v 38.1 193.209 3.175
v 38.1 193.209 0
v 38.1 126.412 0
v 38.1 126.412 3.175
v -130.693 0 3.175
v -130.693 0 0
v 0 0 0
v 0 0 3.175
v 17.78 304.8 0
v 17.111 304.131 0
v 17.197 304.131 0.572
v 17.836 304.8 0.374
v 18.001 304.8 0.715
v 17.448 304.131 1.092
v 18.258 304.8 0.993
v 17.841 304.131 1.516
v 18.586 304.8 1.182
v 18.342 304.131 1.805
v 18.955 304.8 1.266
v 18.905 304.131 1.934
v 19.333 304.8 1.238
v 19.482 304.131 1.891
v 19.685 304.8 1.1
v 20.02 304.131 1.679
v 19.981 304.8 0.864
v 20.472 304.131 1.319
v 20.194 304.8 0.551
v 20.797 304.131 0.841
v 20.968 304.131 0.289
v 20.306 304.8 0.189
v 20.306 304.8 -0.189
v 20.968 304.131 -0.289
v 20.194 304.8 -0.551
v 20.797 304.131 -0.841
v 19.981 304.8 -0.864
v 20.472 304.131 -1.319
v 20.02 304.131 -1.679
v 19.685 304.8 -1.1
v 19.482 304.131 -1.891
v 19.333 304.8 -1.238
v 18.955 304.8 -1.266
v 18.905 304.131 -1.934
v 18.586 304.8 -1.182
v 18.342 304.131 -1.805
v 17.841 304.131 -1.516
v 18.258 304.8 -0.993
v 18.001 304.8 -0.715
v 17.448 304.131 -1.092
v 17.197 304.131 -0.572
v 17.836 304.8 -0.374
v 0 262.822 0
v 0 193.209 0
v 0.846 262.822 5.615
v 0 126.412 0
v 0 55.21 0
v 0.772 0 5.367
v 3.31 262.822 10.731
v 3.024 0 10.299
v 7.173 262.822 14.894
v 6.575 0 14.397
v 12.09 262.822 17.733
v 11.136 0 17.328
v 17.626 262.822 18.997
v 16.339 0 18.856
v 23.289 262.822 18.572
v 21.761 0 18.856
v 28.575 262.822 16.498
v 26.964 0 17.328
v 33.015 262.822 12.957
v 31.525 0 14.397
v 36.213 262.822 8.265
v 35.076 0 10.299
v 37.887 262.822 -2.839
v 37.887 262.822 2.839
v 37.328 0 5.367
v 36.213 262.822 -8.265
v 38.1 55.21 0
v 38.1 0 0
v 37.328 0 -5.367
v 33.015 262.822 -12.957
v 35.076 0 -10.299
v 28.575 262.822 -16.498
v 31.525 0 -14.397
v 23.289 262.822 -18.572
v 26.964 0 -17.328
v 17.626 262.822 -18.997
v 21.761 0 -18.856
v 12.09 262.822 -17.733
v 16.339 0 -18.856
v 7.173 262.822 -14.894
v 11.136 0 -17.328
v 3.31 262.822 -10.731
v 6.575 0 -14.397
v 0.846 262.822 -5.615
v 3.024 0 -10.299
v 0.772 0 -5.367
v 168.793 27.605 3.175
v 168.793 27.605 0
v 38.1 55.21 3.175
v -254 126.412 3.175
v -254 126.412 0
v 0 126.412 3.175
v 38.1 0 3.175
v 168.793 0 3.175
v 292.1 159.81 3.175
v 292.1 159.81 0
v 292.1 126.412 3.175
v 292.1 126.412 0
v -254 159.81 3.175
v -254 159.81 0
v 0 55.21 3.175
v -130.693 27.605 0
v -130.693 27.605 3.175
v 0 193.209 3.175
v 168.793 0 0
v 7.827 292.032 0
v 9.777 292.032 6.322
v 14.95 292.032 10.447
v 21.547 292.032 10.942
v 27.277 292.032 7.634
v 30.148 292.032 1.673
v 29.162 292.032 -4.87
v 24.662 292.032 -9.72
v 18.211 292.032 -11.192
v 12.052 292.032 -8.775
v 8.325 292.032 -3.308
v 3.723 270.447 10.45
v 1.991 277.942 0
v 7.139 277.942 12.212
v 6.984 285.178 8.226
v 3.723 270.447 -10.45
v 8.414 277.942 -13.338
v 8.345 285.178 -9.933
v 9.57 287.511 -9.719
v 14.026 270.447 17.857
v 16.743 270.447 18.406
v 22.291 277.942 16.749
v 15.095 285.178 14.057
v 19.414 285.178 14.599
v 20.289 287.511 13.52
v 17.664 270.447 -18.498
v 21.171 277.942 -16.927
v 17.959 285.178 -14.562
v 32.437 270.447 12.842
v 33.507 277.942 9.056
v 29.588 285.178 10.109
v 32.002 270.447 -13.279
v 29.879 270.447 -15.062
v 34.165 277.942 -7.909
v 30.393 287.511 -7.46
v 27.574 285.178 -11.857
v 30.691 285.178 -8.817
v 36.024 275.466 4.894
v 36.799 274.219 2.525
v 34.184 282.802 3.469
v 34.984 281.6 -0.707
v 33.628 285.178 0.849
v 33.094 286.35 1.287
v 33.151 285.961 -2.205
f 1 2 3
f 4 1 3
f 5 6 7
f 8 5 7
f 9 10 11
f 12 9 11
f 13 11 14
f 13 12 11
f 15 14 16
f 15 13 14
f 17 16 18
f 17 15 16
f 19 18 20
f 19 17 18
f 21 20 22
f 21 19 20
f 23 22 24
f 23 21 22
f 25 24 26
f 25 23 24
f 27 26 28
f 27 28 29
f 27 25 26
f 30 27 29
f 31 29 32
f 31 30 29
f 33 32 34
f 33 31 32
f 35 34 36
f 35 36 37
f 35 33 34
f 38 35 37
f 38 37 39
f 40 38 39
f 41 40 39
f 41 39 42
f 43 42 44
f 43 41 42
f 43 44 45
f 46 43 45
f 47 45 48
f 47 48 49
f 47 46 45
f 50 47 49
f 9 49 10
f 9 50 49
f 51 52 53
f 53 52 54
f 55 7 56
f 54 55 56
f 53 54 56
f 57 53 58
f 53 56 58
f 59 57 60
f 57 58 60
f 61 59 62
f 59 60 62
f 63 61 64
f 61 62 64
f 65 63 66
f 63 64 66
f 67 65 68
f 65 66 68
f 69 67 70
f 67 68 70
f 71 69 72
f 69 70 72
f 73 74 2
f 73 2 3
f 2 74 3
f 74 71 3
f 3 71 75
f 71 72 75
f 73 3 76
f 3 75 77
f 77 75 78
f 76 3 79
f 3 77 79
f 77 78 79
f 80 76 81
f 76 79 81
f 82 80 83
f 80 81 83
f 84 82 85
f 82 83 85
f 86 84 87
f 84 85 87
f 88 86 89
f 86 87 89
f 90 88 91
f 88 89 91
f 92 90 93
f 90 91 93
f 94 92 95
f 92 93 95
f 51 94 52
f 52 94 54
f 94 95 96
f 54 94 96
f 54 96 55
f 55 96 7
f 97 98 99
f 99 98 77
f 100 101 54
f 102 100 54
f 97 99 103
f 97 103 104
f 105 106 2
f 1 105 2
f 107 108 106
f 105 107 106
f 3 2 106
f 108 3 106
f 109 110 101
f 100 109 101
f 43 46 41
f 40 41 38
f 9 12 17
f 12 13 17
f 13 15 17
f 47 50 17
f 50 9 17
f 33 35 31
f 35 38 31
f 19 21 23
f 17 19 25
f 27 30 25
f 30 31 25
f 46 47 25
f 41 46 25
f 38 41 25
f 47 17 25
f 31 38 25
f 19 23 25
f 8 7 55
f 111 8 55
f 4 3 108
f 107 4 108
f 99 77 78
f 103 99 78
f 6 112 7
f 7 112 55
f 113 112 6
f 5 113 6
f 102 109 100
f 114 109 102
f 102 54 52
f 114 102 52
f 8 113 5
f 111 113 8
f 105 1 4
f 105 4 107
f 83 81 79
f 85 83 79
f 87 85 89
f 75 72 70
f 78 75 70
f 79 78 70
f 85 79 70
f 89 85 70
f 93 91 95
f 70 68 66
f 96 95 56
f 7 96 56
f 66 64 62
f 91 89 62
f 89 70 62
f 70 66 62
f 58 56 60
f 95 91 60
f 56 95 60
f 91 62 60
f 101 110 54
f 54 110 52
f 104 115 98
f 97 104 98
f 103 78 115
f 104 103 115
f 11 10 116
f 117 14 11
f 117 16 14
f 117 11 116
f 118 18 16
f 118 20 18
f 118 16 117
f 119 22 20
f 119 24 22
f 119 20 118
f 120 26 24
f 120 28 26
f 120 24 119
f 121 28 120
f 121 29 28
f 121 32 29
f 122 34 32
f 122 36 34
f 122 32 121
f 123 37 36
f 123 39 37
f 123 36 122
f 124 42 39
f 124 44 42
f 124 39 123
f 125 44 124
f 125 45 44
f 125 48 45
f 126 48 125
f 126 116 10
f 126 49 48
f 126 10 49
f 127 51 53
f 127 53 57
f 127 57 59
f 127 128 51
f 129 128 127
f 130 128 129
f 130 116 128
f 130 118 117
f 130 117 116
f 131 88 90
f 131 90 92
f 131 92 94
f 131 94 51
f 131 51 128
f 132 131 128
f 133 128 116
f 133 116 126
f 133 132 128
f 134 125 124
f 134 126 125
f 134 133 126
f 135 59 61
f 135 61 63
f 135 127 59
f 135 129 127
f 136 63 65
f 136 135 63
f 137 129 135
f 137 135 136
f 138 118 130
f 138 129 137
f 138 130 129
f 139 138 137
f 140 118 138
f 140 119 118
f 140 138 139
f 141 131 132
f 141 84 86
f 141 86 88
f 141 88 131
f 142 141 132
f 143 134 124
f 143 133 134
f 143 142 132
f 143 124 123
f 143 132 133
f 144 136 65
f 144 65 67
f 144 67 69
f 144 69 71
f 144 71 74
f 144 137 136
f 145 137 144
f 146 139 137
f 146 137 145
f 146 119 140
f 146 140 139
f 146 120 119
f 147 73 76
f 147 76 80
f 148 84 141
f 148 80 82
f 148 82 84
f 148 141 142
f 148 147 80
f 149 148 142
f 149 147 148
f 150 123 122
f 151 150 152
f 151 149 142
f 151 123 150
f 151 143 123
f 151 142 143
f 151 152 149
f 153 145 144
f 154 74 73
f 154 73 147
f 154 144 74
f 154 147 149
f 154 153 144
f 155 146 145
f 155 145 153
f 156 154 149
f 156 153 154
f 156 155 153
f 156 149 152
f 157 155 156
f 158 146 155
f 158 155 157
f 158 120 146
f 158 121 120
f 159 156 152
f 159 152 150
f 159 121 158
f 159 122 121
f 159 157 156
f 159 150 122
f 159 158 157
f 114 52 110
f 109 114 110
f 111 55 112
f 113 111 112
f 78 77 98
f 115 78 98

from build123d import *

# Parameters (mm, degrees)
F2_DEPTH = 3.175


# Not quite as in the source:
# - a fillet or chamfer that OpenCascade refuses, or shapes differently, is made with other operations: its cross-section is extruded or revolved along the edge and cut away or added


with BuildPart() as f1:
    # F0 (on Top) → F1 (revolve)
    with BuildSketch(Plane.XY):
        Polygon((0, 55.2100464702), (0, 0), (19.05, 0), (19.05, 304.8), (0, 304.8), (0, 193.2089477777), (0, 126.4116019011), align=None)
    revolve(axis=Axis((19.05, 152.4, 0), (0, 1, 0)))

    # F0 (on Top) → F2 (join)
    with BuildSketch(Plane.XY):
        Polygon((-254, 126.4116019011), (0, 126.4116019011), (0, 193.2089477777), (-254, 159.8102748394), align=None)
        Polygon((38.1, 193.2089477777), (38.1, 126.4116019011), (292.1, 126.4116019011), (292.1, 159.8102748394), align=None)
        Polygon((-130.6934994698, 0), (0, 0), (0, 55.2100464702), (-130.6934994698, 27.6050232351), align=None)
        Polygon((38.1, 55.2100464702), (38.1, 0), (168.7934994698, 0), (168.7934994698, 27.6050232351), align=None)
    extrude(amount=F2_DEPTH)

    # F3: chamfer of 17.78 on 1 edges, made by hand

    # F3_s1 → F3_t2 (revolve, cut)
    with BuildSketch(Plane.XY):
        Polygon((0, 287.02), (17.78, 304.8), (0, 304.8), align=None)
    revolve(axis=Axis((19.05, 304.8, 0), (0, 1, 0)), mode=Mode.SUBTRACT)

    # F4: fillet of radius 58.42 on 1 edges, made by hand

    # F4_s1 → F4_t2 (revolve, cut)
    with BuildSketch(Plane.XY):
        with BuildLine():
            ThreePointArc((0, 262.8216436862), (4.4469577107, 285.1780098049), (17.1108218431, 304.1308218431))
            Line((17.1108218431, 304.1308218431), (0, 287.02))
            Line((0, 287.02), (0, 262.8216436862))
        make_face()
    revolve(axis=Axis((19.05, 287.02, 0), (0, 1, 0)), mode=Mode.SUBTRACT)


solid = f1.part
